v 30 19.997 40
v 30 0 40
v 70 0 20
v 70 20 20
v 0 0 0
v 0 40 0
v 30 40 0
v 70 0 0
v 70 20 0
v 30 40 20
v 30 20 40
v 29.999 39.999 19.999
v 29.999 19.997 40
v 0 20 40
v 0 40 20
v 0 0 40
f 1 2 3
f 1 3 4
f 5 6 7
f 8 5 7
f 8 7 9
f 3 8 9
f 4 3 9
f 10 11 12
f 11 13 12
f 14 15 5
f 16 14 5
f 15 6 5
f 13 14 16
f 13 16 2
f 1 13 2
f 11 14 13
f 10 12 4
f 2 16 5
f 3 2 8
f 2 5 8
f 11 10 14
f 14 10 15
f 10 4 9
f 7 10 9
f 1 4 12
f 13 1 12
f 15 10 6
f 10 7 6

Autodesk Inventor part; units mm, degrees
ref_plane "YZ Plane" through (0, 0, 0) normal (1, 0, 0) x (0, 1, 0)
ref_plane "XZ Plane" through (0, 0, 0) normal (0, 1, 0) x (-1, 0, 0)
sketch "草圖5" plane through (0, 0, 0) normal (0, 0, 1) x (1, 0, 0)
  line L0 (0, 0) -> (70, 0)
  line L1 (70, 0) -> (70, 40)
  line L2 (70, 40) -> (0, 40)
  line L3 (0, 40) -> (0, 0)
  dimension "d20" = 70
  dimension "d21" = 40
extrude "擠出5" add sketch "草圖5" along normal blind 40
chamfer "倒角2" distance 20 distance2 40 1 edges at (70, 40, 20) measured on face at (70, 13.3333, 13.3333)
chamfer "倒角3" distance 20 distance2 20 1 edges at (15, 40, 40) measured on face at (33.3333, 13.3333, 40)
chamfer "倒角4" distance 40 distance2 20 1 edges at (70, 10, 40) measured on face at (23.3333, 13.3333, 40)
ref_plane "工作平面1" through (70, 20, 20) normal (0.3333, 0.6667, 0.6667) x (-0.8944, 0.4472, 0)
sketch "草圖9" plane through (70, 20, 20) normal (0.3333, 0.6667, 0.6667) x (-0.8944, 0.4472, 0)
  point P0 (53.6656, 17.8885)
sketch "草圖10" plane through (70, 20, 20) normal (0.3333, 0.6667, 0.6667) x (-0.8944, 0.4472, 0)
  line L0 (44.7214, -14.9071) -> (44.7214, 0) projected
  line L1 (44.7214, 0) -> (0, 0)
  line L2 (53.6656, 17.8885) -> (-8.9443, -2.9814) projected
  line L3 (0, 0) -> (35.7302, 26.9735)
  line L4 (44.7214, 0) -> (71.5542, 8.9443) projected
  line L5 (35.7302, 26.9735) -> (44.7214, 0)
extrude "擠出8" cut sketch "草圖10" along normal through all
